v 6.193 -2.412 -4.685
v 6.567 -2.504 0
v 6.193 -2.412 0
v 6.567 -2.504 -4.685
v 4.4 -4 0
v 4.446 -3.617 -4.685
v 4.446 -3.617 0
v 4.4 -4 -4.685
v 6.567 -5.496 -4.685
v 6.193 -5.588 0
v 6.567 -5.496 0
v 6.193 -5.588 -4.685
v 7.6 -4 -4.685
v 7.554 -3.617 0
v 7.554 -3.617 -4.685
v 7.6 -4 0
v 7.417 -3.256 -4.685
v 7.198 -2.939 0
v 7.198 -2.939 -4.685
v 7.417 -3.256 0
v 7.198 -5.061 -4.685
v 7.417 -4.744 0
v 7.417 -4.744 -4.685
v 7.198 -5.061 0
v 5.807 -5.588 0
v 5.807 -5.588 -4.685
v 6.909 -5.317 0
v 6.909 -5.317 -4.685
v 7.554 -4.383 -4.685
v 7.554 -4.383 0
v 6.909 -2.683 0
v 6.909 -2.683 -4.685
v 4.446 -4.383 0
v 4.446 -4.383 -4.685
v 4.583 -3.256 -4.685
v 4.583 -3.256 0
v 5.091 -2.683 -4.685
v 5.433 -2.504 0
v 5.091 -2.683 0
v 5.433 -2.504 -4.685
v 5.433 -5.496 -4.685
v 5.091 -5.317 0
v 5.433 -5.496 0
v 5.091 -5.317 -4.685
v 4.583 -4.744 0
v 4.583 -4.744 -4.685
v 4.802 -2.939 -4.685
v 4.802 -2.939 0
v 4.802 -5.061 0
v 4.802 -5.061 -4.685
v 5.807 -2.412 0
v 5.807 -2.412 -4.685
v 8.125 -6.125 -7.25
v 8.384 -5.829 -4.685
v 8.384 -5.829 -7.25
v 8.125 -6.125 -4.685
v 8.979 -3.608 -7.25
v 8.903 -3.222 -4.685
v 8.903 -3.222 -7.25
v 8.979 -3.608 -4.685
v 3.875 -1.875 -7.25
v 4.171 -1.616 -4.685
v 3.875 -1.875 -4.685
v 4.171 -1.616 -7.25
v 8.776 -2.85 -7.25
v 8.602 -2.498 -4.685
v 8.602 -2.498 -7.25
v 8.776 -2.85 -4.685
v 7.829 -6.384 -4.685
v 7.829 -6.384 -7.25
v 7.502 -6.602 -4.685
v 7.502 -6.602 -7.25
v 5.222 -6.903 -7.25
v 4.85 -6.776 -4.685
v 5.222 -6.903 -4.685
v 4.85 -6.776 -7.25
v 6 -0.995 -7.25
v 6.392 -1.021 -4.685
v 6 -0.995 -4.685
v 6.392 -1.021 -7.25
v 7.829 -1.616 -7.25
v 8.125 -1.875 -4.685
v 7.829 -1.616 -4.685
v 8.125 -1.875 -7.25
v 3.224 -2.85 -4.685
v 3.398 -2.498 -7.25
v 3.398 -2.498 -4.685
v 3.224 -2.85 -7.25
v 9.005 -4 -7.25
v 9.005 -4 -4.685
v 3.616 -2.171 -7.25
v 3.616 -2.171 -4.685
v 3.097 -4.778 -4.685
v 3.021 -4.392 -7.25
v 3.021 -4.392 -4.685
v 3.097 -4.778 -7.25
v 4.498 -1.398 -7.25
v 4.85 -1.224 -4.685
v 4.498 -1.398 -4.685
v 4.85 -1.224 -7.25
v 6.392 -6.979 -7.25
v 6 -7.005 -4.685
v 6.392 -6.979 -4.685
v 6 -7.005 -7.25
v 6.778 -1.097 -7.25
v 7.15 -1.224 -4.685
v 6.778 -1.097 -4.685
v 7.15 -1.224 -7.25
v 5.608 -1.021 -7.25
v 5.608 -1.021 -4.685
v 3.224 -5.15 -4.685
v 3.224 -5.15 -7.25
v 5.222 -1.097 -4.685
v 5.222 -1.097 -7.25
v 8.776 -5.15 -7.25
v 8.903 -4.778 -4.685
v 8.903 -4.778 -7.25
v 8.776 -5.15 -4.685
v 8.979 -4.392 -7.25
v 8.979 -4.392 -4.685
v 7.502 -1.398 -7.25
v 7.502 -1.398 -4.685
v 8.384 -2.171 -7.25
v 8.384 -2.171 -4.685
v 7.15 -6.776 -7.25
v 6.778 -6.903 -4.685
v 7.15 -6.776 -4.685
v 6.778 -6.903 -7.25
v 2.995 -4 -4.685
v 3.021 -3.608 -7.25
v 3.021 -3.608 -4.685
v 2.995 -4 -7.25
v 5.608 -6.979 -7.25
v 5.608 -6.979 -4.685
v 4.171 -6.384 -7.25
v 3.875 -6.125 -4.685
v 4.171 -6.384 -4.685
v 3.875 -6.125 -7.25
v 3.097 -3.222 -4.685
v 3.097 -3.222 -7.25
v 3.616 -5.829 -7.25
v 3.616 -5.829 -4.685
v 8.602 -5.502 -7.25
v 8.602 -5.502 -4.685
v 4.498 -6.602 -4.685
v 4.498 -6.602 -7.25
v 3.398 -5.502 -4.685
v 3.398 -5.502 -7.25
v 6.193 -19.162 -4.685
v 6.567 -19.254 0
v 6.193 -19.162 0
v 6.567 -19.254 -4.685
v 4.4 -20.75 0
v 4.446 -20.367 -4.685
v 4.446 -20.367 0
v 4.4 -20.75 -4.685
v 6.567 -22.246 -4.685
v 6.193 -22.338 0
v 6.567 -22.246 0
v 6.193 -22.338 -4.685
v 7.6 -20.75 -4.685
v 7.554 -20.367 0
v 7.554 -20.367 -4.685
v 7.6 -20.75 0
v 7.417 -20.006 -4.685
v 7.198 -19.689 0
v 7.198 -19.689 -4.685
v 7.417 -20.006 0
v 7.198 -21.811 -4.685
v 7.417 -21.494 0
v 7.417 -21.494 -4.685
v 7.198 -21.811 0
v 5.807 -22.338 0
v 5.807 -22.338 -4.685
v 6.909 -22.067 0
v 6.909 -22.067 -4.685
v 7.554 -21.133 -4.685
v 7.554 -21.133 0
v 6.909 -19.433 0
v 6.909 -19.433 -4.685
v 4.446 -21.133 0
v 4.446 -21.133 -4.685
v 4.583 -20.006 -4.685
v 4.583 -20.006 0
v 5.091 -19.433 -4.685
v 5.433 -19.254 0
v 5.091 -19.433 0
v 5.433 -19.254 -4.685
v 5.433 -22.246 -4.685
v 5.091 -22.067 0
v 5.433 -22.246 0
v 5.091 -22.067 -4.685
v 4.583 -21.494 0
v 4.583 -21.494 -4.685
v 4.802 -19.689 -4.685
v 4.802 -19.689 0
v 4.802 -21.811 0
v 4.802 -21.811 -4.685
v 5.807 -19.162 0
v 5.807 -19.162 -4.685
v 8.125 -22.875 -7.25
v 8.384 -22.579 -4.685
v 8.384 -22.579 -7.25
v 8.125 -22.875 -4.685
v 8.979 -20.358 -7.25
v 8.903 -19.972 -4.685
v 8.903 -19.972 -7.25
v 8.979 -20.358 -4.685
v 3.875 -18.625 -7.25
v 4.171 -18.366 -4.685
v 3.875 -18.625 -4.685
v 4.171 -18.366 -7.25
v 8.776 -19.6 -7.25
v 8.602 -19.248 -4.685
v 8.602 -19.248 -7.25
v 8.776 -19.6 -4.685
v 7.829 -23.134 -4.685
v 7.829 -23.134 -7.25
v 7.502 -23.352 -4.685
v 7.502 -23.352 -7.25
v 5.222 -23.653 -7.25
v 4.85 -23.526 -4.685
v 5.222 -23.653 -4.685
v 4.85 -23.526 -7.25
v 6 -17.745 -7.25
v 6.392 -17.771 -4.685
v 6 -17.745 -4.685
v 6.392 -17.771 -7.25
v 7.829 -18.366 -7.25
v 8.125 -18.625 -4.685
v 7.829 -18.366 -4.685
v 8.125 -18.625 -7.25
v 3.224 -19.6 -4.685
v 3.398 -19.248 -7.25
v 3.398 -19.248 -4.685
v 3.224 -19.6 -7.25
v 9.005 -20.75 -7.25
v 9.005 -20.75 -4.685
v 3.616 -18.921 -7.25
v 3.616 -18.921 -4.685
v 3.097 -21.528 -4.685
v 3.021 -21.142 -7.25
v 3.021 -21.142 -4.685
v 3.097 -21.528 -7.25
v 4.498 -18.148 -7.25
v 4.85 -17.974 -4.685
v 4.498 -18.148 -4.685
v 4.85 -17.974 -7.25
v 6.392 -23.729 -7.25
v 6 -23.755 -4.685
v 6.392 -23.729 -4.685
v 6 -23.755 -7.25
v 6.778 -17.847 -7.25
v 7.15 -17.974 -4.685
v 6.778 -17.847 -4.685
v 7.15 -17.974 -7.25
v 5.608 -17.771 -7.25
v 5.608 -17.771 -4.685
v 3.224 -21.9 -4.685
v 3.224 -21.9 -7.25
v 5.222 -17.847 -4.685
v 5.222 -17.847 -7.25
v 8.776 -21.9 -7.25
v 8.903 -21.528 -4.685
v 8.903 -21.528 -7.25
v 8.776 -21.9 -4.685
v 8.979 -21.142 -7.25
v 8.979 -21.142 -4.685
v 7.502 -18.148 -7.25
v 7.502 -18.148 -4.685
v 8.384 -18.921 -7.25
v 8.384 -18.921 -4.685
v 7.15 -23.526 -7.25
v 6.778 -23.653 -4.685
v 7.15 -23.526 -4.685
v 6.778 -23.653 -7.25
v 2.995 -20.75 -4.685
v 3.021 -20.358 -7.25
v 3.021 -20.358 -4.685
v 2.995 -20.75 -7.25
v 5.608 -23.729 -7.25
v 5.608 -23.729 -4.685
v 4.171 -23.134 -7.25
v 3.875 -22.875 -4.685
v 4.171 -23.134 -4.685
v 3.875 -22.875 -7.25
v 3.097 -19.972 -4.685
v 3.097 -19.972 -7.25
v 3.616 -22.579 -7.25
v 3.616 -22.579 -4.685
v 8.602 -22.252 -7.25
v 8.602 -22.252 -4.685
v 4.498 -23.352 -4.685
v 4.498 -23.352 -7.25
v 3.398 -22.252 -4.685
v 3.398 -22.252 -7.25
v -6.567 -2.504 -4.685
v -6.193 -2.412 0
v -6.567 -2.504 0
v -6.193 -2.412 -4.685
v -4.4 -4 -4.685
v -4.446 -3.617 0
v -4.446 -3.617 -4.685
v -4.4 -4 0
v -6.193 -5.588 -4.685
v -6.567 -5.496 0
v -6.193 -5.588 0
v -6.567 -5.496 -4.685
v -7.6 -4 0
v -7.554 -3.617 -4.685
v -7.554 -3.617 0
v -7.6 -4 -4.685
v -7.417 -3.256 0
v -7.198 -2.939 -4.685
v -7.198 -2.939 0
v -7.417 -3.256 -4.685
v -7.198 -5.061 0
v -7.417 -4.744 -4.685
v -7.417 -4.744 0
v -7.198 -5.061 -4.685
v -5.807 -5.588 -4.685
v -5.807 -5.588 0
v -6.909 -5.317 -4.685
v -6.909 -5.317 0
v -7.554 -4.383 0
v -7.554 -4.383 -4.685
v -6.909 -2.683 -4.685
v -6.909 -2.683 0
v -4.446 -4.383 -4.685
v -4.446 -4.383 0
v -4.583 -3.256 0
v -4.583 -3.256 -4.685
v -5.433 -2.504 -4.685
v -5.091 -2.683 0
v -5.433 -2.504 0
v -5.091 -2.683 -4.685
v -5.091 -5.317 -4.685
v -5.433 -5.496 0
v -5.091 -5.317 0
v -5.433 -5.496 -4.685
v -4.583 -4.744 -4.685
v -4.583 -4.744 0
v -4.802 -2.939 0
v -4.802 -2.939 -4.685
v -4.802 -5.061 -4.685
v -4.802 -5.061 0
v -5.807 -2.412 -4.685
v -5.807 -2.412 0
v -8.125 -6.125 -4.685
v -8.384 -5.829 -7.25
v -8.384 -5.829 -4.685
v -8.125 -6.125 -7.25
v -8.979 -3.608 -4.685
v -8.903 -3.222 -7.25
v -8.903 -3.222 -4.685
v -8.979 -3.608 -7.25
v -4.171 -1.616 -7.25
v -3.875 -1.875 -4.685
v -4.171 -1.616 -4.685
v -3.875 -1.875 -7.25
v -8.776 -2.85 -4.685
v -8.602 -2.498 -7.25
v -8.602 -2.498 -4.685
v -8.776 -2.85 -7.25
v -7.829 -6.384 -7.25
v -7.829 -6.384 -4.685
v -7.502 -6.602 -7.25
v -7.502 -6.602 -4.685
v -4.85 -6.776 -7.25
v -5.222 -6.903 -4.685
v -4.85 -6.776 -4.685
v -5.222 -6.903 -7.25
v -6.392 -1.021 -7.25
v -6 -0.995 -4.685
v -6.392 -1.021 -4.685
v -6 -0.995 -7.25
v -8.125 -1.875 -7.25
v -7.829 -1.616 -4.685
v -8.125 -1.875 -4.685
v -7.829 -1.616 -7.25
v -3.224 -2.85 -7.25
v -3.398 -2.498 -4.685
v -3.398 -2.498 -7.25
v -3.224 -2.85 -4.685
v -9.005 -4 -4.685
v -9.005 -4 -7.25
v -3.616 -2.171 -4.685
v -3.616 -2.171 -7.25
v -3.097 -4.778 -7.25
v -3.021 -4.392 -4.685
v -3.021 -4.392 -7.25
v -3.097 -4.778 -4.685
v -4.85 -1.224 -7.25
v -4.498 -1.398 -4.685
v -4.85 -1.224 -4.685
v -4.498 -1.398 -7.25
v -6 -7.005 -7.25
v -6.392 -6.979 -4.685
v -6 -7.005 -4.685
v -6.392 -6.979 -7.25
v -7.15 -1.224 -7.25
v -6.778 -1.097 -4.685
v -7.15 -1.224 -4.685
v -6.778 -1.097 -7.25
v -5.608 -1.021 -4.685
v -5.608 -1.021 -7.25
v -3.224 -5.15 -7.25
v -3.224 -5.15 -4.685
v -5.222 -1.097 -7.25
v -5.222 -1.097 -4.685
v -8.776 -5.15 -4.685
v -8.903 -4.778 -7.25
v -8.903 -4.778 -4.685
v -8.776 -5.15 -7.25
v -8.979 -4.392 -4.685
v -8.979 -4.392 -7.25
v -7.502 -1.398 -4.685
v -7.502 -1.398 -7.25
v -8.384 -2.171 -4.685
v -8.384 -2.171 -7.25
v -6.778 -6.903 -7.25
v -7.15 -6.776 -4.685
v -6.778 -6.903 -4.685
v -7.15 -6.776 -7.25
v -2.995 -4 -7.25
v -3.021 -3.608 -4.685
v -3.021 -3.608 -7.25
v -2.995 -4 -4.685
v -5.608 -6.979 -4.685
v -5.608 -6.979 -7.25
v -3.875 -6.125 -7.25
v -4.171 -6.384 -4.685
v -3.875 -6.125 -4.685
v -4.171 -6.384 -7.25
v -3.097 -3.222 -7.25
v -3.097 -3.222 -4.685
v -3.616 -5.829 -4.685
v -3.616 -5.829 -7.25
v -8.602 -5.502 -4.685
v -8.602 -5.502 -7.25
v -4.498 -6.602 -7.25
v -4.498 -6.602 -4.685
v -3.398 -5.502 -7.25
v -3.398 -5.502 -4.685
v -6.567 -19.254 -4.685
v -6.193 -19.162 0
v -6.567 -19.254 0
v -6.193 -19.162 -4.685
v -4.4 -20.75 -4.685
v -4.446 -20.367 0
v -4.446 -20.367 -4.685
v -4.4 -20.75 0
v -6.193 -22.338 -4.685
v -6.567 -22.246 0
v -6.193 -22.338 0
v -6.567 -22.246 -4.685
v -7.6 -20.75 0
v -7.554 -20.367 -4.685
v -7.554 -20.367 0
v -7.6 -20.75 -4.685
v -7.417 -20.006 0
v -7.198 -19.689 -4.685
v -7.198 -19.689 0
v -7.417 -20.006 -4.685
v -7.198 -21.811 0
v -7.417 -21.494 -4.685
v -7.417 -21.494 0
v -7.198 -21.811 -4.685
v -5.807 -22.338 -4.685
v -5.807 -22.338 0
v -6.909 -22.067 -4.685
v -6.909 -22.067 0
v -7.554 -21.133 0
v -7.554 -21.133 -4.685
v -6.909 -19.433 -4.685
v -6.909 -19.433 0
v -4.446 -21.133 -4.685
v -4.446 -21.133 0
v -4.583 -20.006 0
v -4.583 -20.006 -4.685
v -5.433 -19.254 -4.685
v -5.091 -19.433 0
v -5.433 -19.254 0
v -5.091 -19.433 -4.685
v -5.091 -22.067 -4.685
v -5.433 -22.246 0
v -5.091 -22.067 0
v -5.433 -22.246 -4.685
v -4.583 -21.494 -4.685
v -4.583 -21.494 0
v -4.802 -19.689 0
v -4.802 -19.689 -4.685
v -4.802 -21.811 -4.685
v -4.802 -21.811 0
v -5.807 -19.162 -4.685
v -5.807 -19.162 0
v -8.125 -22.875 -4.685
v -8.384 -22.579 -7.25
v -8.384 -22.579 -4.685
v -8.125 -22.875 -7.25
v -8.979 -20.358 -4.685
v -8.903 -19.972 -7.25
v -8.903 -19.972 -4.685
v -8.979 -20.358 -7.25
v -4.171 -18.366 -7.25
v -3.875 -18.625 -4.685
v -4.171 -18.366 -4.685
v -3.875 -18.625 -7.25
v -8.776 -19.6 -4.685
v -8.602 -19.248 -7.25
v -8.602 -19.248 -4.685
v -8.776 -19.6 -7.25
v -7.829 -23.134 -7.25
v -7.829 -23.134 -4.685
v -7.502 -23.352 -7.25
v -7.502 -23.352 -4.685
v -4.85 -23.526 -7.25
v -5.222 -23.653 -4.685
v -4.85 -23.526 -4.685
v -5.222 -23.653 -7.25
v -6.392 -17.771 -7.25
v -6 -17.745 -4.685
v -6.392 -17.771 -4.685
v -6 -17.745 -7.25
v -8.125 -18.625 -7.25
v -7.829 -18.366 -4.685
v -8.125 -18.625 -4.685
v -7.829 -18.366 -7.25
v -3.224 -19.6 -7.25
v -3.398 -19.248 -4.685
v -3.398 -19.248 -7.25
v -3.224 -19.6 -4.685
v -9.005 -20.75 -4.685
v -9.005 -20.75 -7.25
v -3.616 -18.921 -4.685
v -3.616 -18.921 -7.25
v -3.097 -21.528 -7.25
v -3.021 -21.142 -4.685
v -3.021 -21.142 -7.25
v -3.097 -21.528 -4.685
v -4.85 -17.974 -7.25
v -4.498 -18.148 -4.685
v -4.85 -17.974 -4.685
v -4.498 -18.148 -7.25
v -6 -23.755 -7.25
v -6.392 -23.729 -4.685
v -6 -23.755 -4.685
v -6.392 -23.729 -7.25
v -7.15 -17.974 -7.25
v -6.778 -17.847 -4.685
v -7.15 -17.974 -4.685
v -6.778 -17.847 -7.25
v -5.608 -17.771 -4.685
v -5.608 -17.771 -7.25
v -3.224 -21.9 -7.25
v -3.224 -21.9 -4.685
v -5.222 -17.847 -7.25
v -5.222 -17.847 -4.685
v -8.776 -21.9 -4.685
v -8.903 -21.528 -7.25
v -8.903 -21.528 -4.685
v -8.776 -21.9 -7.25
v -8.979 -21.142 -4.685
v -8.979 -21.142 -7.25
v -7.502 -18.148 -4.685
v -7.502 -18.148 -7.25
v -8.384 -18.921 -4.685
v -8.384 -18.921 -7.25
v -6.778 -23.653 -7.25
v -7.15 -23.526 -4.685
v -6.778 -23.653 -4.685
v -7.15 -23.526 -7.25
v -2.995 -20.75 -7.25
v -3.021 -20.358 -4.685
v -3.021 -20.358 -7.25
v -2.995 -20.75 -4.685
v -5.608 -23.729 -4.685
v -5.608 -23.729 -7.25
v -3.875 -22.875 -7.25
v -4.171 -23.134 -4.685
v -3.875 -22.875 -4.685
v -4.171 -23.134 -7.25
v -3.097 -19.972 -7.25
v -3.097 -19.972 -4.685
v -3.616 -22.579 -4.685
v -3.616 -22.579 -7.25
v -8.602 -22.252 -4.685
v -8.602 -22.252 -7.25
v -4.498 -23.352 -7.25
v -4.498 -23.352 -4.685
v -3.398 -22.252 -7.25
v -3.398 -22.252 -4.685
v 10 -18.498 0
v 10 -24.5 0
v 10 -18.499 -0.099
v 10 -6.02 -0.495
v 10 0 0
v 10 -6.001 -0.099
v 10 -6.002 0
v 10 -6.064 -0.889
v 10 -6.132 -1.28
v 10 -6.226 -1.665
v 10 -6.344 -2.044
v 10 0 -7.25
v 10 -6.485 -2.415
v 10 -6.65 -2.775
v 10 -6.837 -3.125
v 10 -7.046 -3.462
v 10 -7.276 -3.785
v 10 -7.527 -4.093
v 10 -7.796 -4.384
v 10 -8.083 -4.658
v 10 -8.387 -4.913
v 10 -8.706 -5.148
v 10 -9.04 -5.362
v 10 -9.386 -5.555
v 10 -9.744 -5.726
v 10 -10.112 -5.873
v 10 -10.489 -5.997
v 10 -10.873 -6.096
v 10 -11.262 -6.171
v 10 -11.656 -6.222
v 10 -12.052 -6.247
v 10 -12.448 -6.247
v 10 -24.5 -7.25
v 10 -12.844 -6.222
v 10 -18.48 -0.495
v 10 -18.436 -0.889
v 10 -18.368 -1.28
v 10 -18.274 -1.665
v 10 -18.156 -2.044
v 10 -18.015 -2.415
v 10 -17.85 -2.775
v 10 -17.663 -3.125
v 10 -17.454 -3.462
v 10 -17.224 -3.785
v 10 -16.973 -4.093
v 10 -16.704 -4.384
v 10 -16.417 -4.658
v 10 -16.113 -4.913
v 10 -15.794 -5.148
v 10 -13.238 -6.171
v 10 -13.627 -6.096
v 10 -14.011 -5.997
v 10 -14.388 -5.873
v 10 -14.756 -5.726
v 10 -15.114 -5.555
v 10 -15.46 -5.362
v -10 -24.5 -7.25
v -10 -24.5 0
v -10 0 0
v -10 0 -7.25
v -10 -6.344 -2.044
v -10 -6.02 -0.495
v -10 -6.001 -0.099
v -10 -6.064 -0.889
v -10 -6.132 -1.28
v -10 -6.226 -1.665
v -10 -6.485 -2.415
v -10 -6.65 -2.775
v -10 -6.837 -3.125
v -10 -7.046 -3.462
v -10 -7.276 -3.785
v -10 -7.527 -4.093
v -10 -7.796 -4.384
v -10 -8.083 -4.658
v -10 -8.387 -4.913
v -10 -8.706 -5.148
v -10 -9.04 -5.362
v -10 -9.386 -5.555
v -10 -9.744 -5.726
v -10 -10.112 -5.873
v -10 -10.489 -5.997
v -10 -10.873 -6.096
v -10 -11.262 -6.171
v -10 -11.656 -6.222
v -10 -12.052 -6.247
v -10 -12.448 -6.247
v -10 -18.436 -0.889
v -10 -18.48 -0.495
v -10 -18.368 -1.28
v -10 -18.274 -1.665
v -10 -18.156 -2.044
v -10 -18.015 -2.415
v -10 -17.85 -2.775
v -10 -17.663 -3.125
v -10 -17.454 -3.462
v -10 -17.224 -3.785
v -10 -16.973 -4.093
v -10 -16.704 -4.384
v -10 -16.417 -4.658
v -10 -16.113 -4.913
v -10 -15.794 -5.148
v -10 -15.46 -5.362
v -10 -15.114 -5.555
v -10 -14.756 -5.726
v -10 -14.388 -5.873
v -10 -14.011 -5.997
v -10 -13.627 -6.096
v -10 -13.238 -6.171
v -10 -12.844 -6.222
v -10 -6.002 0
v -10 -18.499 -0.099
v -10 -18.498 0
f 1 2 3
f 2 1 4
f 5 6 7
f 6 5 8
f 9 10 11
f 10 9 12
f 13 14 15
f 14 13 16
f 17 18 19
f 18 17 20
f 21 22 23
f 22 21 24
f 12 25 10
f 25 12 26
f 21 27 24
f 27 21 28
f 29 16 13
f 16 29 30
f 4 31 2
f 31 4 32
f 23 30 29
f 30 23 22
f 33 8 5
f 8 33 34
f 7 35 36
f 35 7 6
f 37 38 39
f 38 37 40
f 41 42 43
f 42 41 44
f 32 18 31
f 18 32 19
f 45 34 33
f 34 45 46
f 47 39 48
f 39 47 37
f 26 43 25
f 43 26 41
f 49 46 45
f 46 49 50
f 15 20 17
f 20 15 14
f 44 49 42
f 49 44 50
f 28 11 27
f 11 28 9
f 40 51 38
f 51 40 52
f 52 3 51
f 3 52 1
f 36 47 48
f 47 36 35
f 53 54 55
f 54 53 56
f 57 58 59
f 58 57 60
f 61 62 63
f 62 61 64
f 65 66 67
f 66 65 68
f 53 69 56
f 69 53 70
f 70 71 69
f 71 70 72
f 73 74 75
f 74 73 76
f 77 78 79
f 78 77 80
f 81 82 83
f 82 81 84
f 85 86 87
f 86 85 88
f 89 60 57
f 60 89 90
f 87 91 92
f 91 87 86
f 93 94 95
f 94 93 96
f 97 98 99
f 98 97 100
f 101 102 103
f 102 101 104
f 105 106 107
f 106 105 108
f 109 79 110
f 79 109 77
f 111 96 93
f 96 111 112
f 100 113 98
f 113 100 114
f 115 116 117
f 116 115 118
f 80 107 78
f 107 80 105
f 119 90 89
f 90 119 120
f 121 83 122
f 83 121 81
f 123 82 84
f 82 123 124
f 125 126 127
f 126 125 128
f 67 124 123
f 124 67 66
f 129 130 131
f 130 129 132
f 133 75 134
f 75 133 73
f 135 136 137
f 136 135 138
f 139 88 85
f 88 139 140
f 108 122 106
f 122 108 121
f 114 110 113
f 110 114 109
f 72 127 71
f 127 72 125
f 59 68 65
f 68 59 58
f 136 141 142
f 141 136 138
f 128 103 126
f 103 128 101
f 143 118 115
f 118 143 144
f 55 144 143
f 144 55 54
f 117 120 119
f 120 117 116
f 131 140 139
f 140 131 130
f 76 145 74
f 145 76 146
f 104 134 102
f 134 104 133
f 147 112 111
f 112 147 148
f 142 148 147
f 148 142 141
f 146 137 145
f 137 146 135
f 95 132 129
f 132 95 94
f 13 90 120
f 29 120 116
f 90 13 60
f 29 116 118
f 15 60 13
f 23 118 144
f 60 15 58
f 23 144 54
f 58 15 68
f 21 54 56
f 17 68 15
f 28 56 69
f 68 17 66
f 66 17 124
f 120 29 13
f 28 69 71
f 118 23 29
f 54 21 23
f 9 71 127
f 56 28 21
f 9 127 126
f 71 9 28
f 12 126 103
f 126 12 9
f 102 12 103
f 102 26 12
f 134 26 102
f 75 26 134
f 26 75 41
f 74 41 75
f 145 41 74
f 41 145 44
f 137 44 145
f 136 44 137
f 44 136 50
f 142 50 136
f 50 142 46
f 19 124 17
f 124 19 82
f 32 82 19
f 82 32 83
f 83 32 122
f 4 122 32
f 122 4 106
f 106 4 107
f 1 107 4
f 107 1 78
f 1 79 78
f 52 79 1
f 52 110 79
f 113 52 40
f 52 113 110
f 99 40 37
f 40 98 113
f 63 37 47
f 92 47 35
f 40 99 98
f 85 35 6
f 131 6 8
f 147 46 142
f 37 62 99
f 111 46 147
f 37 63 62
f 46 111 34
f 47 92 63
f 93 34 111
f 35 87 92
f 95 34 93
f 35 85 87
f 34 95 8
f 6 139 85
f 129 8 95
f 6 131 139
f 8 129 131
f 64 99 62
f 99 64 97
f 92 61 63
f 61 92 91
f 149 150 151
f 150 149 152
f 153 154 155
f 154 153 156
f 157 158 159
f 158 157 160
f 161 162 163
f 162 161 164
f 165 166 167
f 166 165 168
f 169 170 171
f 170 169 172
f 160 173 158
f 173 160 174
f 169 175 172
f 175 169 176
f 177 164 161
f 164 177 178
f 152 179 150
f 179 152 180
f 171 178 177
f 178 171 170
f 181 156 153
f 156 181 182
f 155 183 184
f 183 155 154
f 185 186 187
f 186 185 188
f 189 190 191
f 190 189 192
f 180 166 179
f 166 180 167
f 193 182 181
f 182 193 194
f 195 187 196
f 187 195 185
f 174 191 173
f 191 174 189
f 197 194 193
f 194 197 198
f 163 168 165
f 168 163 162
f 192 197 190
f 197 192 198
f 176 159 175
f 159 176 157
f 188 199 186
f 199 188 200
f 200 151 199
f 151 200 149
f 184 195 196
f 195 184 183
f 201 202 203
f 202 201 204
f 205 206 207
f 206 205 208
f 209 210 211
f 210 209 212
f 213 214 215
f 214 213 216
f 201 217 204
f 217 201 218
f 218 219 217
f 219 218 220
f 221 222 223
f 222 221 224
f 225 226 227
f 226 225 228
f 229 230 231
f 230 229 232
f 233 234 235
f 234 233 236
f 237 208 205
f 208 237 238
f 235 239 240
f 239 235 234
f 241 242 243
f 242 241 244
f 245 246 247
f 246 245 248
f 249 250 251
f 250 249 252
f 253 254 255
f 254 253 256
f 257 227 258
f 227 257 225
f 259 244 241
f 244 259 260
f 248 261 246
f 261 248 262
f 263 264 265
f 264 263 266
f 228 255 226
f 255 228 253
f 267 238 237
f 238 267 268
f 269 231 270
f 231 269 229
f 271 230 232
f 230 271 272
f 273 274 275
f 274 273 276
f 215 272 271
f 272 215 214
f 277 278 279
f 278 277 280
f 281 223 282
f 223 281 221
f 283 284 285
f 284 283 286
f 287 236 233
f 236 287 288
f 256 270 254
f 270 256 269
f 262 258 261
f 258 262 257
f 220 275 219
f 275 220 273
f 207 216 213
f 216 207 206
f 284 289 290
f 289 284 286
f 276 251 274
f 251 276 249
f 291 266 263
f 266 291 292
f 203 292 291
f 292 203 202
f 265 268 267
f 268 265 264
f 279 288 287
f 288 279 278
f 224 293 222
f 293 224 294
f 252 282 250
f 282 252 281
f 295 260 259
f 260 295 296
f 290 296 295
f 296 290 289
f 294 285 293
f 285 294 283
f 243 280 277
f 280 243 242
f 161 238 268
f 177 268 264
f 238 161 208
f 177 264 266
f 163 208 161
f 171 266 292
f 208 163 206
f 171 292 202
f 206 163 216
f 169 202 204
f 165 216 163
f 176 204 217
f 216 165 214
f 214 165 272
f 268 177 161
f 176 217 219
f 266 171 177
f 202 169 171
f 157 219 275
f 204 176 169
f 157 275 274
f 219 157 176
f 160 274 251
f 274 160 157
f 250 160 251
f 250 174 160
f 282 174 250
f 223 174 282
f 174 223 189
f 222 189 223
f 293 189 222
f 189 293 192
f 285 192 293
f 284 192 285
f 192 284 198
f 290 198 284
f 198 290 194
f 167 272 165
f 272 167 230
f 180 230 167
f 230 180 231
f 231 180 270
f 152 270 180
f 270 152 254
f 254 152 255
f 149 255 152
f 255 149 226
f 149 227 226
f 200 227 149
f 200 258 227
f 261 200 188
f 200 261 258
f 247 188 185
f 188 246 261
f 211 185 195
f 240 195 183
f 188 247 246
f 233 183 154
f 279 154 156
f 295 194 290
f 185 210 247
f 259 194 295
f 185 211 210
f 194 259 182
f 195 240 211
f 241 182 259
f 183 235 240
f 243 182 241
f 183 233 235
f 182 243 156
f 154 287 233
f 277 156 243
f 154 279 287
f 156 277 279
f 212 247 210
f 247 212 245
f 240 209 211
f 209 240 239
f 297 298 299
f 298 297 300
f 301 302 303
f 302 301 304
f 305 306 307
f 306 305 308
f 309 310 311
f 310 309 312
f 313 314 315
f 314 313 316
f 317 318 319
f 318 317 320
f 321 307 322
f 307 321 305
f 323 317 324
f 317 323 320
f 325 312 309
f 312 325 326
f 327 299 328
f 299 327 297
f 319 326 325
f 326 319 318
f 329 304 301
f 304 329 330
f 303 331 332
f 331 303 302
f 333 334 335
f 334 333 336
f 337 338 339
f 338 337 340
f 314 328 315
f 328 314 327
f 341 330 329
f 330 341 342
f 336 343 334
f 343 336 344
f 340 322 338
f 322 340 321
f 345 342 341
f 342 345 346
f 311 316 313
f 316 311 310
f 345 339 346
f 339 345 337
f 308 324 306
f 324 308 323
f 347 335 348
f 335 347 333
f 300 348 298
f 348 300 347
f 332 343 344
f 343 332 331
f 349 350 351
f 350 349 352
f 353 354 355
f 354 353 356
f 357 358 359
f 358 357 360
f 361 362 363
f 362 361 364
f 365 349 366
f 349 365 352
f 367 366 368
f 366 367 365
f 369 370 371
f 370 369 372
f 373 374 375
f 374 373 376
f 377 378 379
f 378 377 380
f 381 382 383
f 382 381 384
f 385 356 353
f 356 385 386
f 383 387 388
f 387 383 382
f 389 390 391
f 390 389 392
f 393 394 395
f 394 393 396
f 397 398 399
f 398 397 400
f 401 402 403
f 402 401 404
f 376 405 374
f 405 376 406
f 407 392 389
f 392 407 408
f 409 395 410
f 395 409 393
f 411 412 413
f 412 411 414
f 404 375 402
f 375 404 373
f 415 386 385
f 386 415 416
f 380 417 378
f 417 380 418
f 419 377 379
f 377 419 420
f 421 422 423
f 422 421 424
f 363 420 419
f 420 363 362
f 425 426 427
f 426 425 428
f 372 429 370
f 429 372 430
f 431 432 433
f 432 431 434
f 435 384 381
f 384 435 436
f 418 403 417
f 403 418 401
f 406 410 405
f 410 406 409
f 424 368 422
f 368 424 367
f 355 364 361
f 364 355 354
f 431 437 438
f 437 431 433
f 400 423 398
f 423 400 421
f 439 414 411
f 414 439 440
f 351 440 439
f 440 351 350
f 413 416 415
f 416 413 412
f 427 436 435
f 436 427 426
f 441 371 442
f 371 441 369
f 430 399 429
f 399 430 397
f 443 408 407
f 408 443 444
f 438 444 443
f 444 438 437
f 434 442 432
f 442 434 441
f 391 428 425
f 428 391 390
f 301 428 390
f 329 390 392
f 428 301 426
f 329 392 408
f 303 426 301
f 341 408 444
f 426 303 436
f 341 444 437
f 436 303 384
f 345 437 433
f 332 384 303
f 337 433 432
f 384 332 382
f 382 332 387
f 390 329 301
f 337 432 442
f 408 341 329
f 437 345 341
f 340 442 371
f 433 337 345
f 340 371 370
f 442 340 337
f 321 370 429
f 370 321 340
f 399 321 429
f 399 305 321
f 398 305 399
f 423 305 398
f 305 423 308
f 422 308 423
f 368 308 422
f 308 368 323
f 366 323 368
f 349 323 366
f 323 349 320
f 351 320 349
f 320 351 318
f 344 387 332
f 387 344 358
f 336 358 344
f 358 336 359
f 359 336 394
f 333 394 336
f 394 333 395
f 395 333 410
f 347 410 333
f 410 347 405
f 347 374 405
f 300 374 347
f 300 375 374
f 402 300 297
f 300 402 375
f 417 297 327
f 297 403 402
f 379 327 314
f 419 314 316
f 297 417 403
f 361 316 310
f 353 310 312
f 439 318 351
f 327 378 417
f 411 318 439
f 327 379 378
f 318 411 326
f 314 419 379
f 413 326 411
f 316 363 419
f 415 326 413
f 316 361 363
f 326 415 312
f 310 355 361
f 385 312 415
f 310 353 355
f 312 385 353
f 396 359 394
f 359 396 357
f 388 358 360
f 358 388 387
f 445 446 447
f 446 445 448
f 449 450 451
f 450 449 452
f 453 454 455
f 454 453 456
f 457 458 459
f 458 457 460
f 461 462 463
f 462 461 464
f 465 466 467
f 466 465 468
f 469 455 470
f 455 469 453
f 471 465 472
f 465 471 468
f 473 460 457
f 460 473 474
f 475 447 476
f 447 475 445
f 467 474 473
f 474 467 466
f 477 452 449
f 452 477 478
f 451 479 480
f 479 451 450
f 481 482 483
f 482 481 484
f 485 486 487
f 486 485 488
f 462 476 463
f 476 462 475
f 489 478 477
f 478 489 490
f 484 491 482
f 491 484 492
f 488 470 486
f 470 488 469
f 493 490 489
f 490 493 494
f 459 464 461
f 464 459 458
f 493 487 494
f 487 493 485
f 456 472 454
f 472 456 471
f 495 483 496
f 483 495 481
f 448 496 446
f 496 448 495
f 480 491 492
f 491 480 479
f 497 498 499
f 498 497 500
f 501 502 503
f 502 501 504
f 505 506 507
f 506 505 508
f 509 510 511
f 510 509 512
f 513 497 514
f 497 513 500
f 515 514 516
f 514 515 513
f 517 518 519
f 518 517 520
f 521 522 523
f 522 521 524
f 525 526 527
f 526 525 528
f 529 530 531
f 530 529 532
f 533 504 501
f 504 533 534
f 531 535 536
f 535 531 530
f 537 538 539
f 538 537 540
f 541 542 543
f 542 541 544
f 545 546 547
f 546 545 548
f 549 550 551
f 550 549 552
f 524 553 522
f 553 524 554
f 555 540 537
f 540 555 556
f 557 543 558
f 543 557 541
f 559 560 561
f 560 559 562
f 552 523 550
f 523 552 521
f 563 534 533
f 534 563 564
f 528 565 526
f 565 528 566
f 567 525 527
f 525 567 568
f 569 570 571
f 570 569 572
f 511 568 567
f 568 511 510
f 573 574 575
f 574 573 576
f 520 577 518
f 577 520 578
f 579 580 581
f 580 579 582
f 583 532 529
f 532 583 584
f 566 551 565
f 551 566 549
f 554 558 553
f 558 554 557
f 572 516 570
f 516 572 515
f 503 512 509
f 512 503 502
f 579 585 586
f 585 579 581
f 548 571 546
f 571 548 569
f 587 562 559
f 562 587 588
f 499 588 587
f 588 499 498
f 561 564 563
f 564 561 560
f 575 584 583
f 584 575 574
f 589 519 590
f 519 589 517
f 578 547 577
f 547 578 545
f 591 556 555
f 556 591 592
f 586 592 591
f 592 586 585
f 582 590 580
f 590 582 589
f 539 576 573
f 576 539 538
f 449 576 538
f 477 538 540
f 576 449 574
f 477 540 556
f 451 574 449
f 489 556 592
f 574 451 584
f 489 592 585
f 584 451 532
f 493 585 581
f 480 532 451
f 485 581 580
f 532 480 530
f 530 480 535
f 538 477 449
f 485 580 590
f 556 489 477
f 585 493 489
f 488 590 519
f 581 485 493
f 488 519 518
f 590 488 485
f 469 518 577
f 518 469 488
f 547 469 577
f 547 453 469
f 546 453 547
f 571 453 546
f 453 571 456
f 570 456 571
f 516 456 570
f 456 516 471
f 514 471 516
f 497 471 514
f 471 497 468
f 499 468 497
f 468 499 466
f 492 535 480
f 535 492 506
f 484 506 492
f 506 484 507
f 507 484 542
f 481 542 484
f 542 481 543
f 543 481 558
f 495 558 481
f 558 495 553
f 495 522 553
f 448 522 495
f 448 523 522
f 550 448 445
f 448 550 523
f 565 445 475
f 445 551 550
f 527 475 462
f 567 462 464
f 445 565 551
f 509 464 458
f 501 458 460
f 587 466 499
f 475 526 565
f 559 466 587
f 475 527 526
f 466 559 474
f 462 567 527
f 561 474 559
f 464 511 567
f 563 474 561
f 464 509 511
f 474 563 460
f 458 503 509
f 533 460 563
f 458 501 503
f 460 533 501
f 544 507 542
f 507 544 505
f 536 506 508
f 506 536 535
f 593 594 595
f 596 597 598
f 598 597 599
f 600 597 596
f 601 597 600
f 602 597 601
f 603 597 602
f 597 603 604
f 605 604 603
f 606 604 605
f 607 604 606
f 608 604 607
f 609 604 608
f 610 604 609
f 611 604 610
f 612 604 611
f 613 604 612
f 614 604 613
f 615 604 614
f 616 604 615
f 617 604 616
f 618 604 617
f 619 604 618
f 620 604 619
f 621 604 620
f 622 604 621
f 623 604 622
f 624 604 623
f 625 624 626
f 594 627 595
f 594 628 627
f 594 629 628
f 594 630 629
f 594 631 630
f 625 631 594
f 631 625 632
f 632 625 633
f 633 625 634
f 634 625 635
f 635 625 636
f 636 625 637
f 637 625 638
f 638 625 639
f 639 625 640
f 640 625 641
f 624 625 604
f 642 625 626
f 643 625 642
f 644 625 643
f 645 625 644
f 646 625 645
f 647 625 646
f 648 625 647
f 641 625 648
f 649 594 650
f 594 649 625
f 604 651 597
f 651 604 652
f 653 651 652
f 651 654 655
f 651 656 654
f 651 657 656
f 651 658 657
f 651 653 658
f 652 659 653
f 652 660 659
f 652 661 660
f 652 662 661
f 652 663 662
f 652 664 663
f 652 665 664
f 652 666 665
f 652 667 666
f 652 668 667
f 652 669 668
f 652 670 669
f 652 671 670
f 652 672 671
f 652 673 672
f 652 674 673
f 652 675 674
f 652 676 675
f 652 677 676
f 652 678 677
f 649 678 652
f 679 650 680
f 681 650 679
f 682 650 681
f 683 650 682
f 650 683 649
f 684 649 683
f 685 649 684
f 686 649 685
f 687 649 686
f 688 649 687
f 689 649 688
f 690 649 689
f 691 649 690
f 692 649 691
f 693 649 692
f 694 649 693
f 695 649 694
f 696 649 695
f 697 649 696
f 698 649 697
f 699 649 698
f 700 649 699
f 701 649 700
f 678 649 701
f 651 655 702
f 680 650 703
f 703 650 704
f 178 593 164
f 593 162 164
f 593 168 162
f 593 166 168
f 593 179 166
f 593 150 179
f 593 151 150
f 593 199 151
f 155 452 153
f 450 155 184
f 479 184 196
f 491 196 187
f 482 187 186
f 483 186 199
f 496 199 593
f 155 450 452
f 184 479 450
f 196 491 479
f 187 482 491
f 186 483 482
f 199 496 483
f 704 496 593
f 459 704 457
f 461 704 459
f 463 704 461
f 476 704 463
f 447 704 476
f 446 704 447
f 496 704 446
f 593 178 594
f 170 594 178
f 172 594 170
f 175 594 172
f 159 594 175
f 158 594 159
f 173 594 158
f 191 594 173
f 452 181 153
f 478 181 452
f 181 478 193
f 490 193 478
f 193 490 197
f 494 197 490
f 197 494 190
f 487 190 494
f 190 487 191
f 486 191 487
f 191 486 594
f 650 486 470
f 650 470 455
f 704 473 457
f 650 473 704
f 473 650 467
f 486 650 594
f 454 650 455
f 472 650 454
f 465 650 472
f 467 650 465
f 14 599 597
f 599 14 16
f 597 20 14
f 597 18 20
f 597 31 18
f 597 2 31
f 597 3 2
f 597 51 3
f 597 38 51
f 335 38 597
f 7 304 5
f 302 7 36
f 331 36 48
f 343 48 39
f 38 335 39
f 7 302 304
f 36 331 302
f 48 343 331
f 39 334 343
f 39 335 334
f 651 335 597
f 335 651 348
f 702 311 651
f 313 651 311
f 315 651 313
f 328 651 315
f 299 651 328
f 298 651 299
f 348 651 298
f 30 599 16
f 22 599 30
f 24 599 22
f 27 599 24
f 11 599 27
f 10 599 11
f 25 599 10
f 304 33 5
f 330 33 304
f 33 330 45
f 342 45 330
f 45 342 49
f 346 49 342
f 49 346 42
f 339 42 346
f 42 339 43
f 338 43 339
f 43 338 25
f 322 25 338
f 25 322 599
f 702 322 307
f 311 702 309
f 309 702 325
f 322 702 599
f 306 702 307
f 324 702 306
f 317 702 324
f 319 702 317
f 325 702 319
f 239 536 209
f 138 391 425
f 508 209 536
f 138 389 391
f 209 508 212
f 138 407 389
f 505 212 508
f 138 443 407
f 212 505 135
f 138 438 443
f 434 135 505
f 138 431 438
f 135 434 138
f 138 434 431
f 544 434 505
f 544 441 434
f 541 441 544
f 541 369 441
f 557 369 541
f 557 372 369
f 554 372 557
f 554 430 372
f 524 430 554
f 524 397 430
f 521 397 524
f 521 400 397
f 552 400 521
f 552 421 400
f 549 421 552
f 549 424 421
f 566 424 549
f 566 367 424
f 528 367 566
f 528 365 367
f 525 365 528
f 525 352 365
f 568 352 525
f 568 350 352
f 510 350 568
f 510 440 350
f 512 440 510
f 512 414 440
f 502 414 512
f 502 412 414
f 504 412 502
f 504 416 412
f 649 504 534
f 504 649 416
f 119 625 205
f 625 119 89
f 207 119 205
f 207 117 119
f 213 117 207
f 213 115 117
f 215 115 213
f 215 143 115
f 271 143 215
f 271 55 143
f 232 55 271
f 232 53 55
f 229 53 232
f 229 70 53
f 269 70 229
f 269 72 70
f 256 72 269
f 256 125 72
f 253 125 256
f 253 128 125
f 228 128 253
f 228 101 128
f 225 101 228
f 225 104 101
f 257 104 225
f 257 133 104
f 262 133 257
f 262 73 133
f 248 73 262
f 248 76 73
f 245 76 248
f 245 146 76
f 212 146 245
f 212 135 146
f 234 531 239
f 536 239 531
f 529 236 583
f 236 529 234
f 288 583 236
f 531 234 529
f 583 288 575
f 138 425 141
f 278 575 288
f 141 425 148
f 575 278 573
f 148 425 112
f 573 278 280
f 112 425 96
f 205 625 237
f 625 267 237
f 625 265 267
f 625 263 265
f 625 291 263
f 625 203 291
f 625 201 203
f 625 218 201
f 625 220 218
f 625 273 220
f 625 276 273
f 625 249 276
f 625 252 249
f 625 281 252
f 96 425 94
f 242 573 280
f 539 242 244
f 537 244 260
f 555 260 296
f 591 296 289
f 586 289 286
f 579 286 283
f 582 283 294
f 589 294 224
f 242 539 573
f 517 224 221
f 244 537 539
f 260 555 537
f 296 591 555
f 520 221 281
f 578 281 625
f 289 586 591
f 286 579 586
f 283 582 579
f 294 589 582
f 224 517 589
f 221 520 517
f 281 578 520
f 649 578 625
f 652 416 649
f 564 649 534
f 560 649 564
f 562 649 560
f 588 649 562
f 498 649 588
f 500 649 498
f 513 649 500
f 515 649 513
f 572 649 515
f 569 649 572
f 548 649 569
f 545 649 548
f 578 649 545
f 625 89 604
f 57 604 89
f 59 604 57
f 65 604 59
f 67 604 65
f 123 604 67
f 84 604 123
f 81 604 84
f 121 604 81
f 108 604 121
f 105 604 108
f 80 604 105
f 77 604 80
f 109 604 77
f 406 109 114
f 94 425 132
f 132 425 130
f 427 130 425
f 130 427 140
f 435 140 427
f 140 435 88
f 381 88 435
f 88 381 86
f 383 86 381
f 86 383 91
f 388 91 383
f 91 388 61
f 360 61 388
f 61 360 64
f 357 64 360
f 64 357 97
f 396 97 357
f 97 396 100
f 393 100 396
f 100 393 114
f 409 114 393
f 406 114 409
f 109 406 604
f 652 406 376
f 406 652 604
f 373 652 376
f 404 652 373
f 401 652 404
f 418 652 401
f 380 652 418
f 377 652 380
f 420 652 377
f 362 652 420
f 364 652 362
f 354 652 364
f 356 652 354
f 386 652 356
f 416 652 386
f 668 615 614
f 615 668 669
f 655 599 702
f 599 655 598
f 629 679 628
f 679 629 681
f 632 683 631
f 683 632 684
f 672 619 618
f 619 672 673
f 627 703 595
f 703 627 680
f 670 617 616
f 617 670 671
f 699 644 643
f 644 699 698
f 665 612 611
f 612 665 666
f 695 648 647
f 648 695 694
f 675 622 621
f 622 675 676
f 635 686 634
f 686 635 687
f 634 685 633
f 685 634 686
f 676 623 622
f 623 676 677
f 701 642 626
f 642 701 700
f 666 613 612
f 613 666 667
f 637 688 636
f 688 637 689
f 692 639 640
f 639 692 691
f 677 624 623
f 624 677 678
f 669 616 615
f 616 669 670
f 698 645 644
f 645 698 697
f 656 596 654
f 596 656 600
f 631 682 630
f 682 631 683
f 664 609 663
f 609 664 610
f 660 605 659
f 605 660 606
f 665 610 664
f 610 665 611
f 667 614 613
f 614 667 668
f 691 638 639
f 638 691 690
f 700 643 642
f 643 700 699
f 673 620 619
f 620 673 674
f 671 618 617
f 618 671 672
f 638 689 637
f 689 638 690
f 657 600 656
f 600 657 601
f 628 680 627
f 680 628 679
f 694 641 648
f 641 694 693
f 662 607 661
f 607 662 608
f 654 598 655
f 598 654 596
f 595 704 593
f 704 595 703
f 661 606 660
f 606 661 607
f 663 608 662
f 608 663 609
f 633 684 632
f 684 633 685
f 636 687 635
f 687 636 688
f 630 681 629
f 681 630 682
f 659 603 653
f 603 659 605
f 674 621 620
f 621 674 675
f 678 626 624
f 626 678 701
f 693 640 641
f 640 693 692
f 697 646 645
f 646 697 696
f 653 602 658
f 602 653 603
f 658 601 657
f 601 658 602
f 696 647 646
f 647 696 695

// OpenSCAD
// file: ../../ref/vendor/_linear_rail.scad
include <../components.scad>

module ref_linear_rail(l,h,w,E,P) {
    // w_r = 12;
    // h_r = 8;
    // D = 6;
    // h = 3.4;
    // d = 3.5;
    // P = 25;
    // E = 10;
    module rail_end() {
        difference() {
            cube([E, h, w], center=true);
            rotate([270,0,0])
                translate([E/2, 0, -h/2])
                    bolt_shcs_m3(h=w);
        }
    }
    module rail_sect() {
        difference() {
            cube([P, h, w], center=true);
            rotate([270,0,0]) {
                translate([P/2, 0, -(h/2)])
                    bolt_shcs_m3(h=h);
                translate([-P/2, 0, -(h/2)])
                    bolt_shcs_m3(h=w);
            }
        }
    }

    tot_length = (l - (E*2));
    // echo(tot_length);
    sect_length = tot_length - (tot_length % P);
    // echo(sect_length);
    sect_count = sect_length/P;
    // echo(sect_count);

    translate([(sect_length/2 + E*2-2.5),0,0])
        rotate([0,180,0])
        rail_end();
    translate([-(sect_length/2 + E*2-2.5),0,0])
        rail_end();

    translate([-sect_length/2,0,0])
        for(i = [0:1:sect_count]) {
            translate([P*i,0,0])
                rail_sect();
        }
}

module ref_linear_rail_carriage(l,w,h,c,b) {
    // w = 27;
    // b = 20;
    // b_1 = 3.5;
    // c = 20;
    // l_1 = 32.4;
    // l = 45.4;
    // h = 10;

    translate([0,-3,0])
    difference() {
        cube([l, h, w], center=true);
        rotate([90,0,0]) {
            translate([0,0,5]) {
                translate([c/2,b/2,-3]) // top right
                    bolt(d=3, h=20);
                translate([c/2,-b/2,0]) // bottom right
                    bolt(d=3, h=20);
                translate([-c/2,b/2,0]) // top left
                    bolt(d=3, h=20);
                translate([-c/2,-b/2,0]) // bottom left
                    bolt(d=3, h=20);
            }
        }
    }
}
// file: ../../ref/vendor/linear_rails.scad
include <./_linear_rail.scad>

module ven_mgn12h() {
    color([0.2,0.2,0.2])
        ref_linear_rail(l=300,h=3.4,w=12,E=10,P=25);
    color([0.4,0.4,0.4])
        ref_linear_rail_carriage(l=45.4,w=27,h=10,c=20,b=20);
}

module ven_mgn9h() {
    color([0.2,0.2,0.2])
        ref_linear_rail(l=160,h=3.5,w=9,E=7.5,P=20);
    color([0.4,0.4,0.4])
        ref_linear_rail_carriage(l=39.9,w=20,h=8,c=16,b=15);
}
// file: ../../ref/vendor/fans.scad
module ven_fan4010() {
    module _4010_corner() {
        difference() {
            cube([20,20,10]);
            translate([32/2+1.5,32/2+1.5,4]) { // Top corner
                cylinder(d=5,h=10);
                translate([-2.5,0,0])
                    cube([5,10,10]);
                translate([0,-2.5,0])
                    cube([10,5,10]);
                translate([2.5,2.5,0])
                    cube([7.5,7.5,10]);
            }
        }
    }
    difference() {
        union() {
            _4010_corner();
            mirror([1,0,0])
                _4010_corner();
            mirror([0,1,0])
                _4010_corner();
            mirror([1,1,0])
                _4010_corner();
        }
        translate([0,5,2.01])
            cylinder(d=28, h=8);
    }
}

module ven_fan2510() {
    cube([25, 25, 10]);
}
// file: ../../ref/components/bolts.scad
module bolt(d, h=8) {
    cylinder(d=d, h=h, center=true);
}

module _bolt_v(d,hh=0,r=0.2) {
    vh = r*5;
    vz = hh+(vh/2);
    difference() {
        translate([0,0,vz])
            cylinder(d=d + 0.01, h=vh, center=true);
        rotate([0,0,0]) {
            translate([d/2,0,vz])
                cube([d/2,d,vh+0.01],center=true);
            translate([-d/2,0,vz])
                cube([d/2,d,vh+0.01],center=true);
        }
        rotate([0,0,0]) {
            translate([0,d/2,vz+r*2])
                cube([d,d/2,1],center=true);
            translate([0,-d/2,vz+r*2])
                cube([d,d/2,vh+0.01],center=true);
        }
        rotate([0,0,45]) {
            translate([0,d/2,vz+r*3])
                cube([d,d/2,vh+0.01],center=true);
            translate([0,-d/2,vz+r*3])
                cube([6,3,vh+0.01],center=true);
        }
        rotate([0,0,-45]) {
            translate([0,d/2,vz+r*4])
                cube([d,d/2,vh+0.01],center=true);
            translate([0,-d/2,vz+r*4])
                cube([d,d/2,vh+0.01],center=true);
        }
    }
}

module bolt_shcs(hd,hh,td,th,
        he, v=false, r=0.2) {
    // hd = head diameter
    // hh = head height
    // td = thread diameter
    // th = thread height
    // he = head extension
    // v = vertical supports
    // r = support resolution
    union() {
        translate([0,0,hh/2-0.01]) // Socket head
            cylinder(d=hd + 0.01, h=hh + 0.05, center=true);
        if (he>0) {
            translate([0,0,-he/2]) // Head extension
                cylinder(d=hd+0.01,h=he,center=true);
        }
        translate([0,0,th/2+hh]) // Threading
            cylinder(d=td, h=th, center=true);
        if (v==true) {
            _bolt_v(hd,hh,r);
        }
    }
}

module bolt_shcs_m2_5(h=8,v=false,r=0.2,he=0) {
    bolt_shcs(hd=5,hh=2.5,th=h,v=v,r=r,he=he);
}

module bolt_shcs_m3(h=8,v=false,r=0.2,he=0) {
    bolt_shcs(hd=6,hh=3,td=3,th=h,v=v,r=r,he=he);
}
// file: ../../ref/components/3dp.scad
module heatset(d=5,h=4,b=3,H=0) {
    // d = inset diameter
    // h = height (length)
    // b = bolt diameter
    // H = bolt height
    union() {
        translate([0,0,h/2-0.01])
            cylinder(h=h+0.02, d=d, center=true);
        translate([0,0,h+H/2 - 0.01])
            bolt(d=b, h=H);
    }
}

module heatset_m3x4(H=0) { // VORON BOM heatset
    heatset(d=4.3, h=4+0.1, b=3+0.2, H=H);
}

module ecas04() { // This is used to cut a spot for an ECAS04 fitting
    ecas04_d = 8.1;
    ecas04_d_1 = 10;
    ecas04_h = 8;
    ecas04_h_1 = 2.4;

    cylinder(d=ecas04_d + 0.3, h=ecas04_h+0.01);
    translate([0,0,0])
        cylinder(d=ecas04_d+1, h=ecas04_h-ecas04_h_1);
}
// file: ../src/hori.scad
module ck_hori() {
    module _hori_base() {
        translate([-d_hori_w/2,-d_bracket_d-2,-d_mount_h-10])
            cube([d_hori_w,d_bracket_d*2-0.25,5]);
        translate([-d_att_w/2,-d_bracket_d-5,-d_mount_h-10])
            cube([d_att_w,5,d_att_h]);
    }
    module _hori_hs() {
        translate([15,8,-d_mount_h-10])
            heatset_m3x4(H=8);
        translate([-13.5,-20,-d_mount_h-6.25])
        rotate([-90,0,0])
            heatset_m3x4(H=1);
    }

    difference() {
        _hori_base();
        _hori_hs();
        mirror([1,0,0])
            _hori_hs();
    }
}
// file: ../src/vert.scad
module ck_vert() {
    module _vert_base() {
        translate([-d_bracket_w/2,d_bracket_d/2,-d_mount_h])
            cube([d_bracket_w,d_vert_d,d_mount_h]);
        // translate([-d_bracket_w/2,0,-d_mount_h-5])
        //     cube([d_bracket_w,d_mount_d+6+1.25,5]);
        translate([-d_hori_w/2,-d_bracket_d/2,-d_mount_h-5])
            cube([d_hori_w,d_bracket_d+5,5]);
        translate([-d_hori_w/2,-d_bracket_d,-d_mount_h-5])
            cube([d_hori_w,d_bracket_d-7,5]);
    }
    module _vert_slot() {
        module _slot() {
            hull() {
                translate([15,8,-d_mount_h-3])
                    cylinder(d=5.5, h=5);
                translate([15,-10,-d_mount_h-3])
                    cylinder(d=5.5, h=5);
            }
            hull() {
                translate([15,8,-d_mount_h-8])
                    cylinder(d=3, h=10);
                translate([15,-10,-d_mount_h-8])
                    cylinder(d=3, h=10);
            }
        }
        _slot();
        mirror([1,0,0])
            _slot();
    }
    module _vert_hs() {
        rotate([90,0,0]) {
            translate([-d_bracket_w/2+5,-4,-13.5])
                heatset_m3x4(H=8);
        }
        rotate([90,0,0]) {
            translate([d_bracket_w/2-5,-4,-13.5])
                heatset_m3x4(H=8);
        }
    }
    difference() {
        _vert_base();
        _vert_slot();
        _vert_hs();
    }
}
// file: ../src/mount.scad
module ck_mount() {
    module _mount_base() {
        translate([-d_bracket_w/2,d_bracket_d/2-d_mount_d,-d_mount_h])
            cube([d_bracket_w,d_mount_d,d_mount_h]);
    }
    module _mount_slot() {
        module _slot() {
            hull() {
                translate([-d_bracket_w/2+5,-2,-4])
                rotate([-90,0,0])
                    cylinder(d=5.5, h=5);
                translate([-d_bracket_w/2+5,-2,-d_mount_h+4])
                rotate([-90,0,0])
                    cylinder(d=5.5, h=5);
            }
            hull() {
                translate([-d_bracket_w/2+5,-2,-4])
                rotate([-90,0,0])
                    cylinder(d=3, h=10);
                translate([-d_bracket_w/2+5,-2,-d_mount_h+4])
                rotate([-90,0,0])
                    cylinder(d=3, h=10);
            }
        }
        _slot();
        mirror([1,0,0])
            _slot();
    }
    difference() {
        _mount_base();
        _mount_slot();
    }
}
// file: ../src/bracket.scad
module ck_bracket_hs() {
    module _hs() {
        translate([6,7.3,4])
        rotate([90,0,0]) {
            heatset_m3x4(H=8);
            translate([0,0,15])
            rotate([180,0,0])
                bolt_shcs_m3();
        }
        translate([6,7.3,d_tube_H+d_tube_d-4])
        rotate([90,0,0]) {
            heatset_m3x4(H=8);
            translate([0,0,15])
            rotate([180,0,0])
                bolt_shcs_m3();
        }
    }
    _hs();
    mirror([1,0,0])
        _hs();
}

module ck_bracket_back() {
    // translate([-d_bracket_d/2,-(d_bracket_w/2),2])
    //     cube([d_bracket_d,d_bracket_w,d_bracket_h]);
    difference() {
        translate([-d_bracket_w/2,0,0])
            cube([d_bracket_w,d_bracket_d/2,d_bracket_h]);
        ck_tube();
        ck_bracket_hs();
    }
}
module ck_bracket_front() {
    difference() {
        translate([-d_bracket_w/2,-d_bracket_d/2,0])
            cube([d_bracket_w,d_bracket_d/2,d_bracket_h]);
        ck_tube();
        ck_bracket_hs();
    }
}
// file: ../src/tube.scad
module ck_tube() {
    translate([-25,0,d_tube_H])
    rotate([90,0,90])
        cylinder(d=d_tube_d, h=50);
}
// file: ../src/dimensions.scad
d_tube_d = 12.5;
d_tube_H = d_tube_d/2+6;
d_bracket_d = d_tube_d+2;
d_bracket_h = d_tube_d+(5*2)+2;
d_bracket_w = 20;

d_mount_h = 25;
d_mount_d = 6;

d_vert_h = 8;
d_vert_d = 5;
d_hori_w = 40;

d_att_w = 36;
d_att_d = 20;
d_att_h = 10;
// file: ../../ref/vendor.scad
include <./vendor/fans.scad>
include <./vendor/linear_rails.scad>
// file: ../../ref/components.scad
include <./components/3dp.scad>
include <./components/bolts.scad>
// file: ../src/main.scad
$fa = 1;
$fs = 0.4;

include <../../lib/Chamfer.scad>

include <../../ref/components.scad>
include <../../ref/vendor.scad>

// --- components --- //
include <./dimensions.scad>

include <./tube.scad>
include <./bracket.scad>
include <./mount.scad>
include <./vert.scad>
include <./hori.scad>
// main file
include <../src/main.scad>

rotate([90,0,0]) {
    ck_bracket_front();
}
